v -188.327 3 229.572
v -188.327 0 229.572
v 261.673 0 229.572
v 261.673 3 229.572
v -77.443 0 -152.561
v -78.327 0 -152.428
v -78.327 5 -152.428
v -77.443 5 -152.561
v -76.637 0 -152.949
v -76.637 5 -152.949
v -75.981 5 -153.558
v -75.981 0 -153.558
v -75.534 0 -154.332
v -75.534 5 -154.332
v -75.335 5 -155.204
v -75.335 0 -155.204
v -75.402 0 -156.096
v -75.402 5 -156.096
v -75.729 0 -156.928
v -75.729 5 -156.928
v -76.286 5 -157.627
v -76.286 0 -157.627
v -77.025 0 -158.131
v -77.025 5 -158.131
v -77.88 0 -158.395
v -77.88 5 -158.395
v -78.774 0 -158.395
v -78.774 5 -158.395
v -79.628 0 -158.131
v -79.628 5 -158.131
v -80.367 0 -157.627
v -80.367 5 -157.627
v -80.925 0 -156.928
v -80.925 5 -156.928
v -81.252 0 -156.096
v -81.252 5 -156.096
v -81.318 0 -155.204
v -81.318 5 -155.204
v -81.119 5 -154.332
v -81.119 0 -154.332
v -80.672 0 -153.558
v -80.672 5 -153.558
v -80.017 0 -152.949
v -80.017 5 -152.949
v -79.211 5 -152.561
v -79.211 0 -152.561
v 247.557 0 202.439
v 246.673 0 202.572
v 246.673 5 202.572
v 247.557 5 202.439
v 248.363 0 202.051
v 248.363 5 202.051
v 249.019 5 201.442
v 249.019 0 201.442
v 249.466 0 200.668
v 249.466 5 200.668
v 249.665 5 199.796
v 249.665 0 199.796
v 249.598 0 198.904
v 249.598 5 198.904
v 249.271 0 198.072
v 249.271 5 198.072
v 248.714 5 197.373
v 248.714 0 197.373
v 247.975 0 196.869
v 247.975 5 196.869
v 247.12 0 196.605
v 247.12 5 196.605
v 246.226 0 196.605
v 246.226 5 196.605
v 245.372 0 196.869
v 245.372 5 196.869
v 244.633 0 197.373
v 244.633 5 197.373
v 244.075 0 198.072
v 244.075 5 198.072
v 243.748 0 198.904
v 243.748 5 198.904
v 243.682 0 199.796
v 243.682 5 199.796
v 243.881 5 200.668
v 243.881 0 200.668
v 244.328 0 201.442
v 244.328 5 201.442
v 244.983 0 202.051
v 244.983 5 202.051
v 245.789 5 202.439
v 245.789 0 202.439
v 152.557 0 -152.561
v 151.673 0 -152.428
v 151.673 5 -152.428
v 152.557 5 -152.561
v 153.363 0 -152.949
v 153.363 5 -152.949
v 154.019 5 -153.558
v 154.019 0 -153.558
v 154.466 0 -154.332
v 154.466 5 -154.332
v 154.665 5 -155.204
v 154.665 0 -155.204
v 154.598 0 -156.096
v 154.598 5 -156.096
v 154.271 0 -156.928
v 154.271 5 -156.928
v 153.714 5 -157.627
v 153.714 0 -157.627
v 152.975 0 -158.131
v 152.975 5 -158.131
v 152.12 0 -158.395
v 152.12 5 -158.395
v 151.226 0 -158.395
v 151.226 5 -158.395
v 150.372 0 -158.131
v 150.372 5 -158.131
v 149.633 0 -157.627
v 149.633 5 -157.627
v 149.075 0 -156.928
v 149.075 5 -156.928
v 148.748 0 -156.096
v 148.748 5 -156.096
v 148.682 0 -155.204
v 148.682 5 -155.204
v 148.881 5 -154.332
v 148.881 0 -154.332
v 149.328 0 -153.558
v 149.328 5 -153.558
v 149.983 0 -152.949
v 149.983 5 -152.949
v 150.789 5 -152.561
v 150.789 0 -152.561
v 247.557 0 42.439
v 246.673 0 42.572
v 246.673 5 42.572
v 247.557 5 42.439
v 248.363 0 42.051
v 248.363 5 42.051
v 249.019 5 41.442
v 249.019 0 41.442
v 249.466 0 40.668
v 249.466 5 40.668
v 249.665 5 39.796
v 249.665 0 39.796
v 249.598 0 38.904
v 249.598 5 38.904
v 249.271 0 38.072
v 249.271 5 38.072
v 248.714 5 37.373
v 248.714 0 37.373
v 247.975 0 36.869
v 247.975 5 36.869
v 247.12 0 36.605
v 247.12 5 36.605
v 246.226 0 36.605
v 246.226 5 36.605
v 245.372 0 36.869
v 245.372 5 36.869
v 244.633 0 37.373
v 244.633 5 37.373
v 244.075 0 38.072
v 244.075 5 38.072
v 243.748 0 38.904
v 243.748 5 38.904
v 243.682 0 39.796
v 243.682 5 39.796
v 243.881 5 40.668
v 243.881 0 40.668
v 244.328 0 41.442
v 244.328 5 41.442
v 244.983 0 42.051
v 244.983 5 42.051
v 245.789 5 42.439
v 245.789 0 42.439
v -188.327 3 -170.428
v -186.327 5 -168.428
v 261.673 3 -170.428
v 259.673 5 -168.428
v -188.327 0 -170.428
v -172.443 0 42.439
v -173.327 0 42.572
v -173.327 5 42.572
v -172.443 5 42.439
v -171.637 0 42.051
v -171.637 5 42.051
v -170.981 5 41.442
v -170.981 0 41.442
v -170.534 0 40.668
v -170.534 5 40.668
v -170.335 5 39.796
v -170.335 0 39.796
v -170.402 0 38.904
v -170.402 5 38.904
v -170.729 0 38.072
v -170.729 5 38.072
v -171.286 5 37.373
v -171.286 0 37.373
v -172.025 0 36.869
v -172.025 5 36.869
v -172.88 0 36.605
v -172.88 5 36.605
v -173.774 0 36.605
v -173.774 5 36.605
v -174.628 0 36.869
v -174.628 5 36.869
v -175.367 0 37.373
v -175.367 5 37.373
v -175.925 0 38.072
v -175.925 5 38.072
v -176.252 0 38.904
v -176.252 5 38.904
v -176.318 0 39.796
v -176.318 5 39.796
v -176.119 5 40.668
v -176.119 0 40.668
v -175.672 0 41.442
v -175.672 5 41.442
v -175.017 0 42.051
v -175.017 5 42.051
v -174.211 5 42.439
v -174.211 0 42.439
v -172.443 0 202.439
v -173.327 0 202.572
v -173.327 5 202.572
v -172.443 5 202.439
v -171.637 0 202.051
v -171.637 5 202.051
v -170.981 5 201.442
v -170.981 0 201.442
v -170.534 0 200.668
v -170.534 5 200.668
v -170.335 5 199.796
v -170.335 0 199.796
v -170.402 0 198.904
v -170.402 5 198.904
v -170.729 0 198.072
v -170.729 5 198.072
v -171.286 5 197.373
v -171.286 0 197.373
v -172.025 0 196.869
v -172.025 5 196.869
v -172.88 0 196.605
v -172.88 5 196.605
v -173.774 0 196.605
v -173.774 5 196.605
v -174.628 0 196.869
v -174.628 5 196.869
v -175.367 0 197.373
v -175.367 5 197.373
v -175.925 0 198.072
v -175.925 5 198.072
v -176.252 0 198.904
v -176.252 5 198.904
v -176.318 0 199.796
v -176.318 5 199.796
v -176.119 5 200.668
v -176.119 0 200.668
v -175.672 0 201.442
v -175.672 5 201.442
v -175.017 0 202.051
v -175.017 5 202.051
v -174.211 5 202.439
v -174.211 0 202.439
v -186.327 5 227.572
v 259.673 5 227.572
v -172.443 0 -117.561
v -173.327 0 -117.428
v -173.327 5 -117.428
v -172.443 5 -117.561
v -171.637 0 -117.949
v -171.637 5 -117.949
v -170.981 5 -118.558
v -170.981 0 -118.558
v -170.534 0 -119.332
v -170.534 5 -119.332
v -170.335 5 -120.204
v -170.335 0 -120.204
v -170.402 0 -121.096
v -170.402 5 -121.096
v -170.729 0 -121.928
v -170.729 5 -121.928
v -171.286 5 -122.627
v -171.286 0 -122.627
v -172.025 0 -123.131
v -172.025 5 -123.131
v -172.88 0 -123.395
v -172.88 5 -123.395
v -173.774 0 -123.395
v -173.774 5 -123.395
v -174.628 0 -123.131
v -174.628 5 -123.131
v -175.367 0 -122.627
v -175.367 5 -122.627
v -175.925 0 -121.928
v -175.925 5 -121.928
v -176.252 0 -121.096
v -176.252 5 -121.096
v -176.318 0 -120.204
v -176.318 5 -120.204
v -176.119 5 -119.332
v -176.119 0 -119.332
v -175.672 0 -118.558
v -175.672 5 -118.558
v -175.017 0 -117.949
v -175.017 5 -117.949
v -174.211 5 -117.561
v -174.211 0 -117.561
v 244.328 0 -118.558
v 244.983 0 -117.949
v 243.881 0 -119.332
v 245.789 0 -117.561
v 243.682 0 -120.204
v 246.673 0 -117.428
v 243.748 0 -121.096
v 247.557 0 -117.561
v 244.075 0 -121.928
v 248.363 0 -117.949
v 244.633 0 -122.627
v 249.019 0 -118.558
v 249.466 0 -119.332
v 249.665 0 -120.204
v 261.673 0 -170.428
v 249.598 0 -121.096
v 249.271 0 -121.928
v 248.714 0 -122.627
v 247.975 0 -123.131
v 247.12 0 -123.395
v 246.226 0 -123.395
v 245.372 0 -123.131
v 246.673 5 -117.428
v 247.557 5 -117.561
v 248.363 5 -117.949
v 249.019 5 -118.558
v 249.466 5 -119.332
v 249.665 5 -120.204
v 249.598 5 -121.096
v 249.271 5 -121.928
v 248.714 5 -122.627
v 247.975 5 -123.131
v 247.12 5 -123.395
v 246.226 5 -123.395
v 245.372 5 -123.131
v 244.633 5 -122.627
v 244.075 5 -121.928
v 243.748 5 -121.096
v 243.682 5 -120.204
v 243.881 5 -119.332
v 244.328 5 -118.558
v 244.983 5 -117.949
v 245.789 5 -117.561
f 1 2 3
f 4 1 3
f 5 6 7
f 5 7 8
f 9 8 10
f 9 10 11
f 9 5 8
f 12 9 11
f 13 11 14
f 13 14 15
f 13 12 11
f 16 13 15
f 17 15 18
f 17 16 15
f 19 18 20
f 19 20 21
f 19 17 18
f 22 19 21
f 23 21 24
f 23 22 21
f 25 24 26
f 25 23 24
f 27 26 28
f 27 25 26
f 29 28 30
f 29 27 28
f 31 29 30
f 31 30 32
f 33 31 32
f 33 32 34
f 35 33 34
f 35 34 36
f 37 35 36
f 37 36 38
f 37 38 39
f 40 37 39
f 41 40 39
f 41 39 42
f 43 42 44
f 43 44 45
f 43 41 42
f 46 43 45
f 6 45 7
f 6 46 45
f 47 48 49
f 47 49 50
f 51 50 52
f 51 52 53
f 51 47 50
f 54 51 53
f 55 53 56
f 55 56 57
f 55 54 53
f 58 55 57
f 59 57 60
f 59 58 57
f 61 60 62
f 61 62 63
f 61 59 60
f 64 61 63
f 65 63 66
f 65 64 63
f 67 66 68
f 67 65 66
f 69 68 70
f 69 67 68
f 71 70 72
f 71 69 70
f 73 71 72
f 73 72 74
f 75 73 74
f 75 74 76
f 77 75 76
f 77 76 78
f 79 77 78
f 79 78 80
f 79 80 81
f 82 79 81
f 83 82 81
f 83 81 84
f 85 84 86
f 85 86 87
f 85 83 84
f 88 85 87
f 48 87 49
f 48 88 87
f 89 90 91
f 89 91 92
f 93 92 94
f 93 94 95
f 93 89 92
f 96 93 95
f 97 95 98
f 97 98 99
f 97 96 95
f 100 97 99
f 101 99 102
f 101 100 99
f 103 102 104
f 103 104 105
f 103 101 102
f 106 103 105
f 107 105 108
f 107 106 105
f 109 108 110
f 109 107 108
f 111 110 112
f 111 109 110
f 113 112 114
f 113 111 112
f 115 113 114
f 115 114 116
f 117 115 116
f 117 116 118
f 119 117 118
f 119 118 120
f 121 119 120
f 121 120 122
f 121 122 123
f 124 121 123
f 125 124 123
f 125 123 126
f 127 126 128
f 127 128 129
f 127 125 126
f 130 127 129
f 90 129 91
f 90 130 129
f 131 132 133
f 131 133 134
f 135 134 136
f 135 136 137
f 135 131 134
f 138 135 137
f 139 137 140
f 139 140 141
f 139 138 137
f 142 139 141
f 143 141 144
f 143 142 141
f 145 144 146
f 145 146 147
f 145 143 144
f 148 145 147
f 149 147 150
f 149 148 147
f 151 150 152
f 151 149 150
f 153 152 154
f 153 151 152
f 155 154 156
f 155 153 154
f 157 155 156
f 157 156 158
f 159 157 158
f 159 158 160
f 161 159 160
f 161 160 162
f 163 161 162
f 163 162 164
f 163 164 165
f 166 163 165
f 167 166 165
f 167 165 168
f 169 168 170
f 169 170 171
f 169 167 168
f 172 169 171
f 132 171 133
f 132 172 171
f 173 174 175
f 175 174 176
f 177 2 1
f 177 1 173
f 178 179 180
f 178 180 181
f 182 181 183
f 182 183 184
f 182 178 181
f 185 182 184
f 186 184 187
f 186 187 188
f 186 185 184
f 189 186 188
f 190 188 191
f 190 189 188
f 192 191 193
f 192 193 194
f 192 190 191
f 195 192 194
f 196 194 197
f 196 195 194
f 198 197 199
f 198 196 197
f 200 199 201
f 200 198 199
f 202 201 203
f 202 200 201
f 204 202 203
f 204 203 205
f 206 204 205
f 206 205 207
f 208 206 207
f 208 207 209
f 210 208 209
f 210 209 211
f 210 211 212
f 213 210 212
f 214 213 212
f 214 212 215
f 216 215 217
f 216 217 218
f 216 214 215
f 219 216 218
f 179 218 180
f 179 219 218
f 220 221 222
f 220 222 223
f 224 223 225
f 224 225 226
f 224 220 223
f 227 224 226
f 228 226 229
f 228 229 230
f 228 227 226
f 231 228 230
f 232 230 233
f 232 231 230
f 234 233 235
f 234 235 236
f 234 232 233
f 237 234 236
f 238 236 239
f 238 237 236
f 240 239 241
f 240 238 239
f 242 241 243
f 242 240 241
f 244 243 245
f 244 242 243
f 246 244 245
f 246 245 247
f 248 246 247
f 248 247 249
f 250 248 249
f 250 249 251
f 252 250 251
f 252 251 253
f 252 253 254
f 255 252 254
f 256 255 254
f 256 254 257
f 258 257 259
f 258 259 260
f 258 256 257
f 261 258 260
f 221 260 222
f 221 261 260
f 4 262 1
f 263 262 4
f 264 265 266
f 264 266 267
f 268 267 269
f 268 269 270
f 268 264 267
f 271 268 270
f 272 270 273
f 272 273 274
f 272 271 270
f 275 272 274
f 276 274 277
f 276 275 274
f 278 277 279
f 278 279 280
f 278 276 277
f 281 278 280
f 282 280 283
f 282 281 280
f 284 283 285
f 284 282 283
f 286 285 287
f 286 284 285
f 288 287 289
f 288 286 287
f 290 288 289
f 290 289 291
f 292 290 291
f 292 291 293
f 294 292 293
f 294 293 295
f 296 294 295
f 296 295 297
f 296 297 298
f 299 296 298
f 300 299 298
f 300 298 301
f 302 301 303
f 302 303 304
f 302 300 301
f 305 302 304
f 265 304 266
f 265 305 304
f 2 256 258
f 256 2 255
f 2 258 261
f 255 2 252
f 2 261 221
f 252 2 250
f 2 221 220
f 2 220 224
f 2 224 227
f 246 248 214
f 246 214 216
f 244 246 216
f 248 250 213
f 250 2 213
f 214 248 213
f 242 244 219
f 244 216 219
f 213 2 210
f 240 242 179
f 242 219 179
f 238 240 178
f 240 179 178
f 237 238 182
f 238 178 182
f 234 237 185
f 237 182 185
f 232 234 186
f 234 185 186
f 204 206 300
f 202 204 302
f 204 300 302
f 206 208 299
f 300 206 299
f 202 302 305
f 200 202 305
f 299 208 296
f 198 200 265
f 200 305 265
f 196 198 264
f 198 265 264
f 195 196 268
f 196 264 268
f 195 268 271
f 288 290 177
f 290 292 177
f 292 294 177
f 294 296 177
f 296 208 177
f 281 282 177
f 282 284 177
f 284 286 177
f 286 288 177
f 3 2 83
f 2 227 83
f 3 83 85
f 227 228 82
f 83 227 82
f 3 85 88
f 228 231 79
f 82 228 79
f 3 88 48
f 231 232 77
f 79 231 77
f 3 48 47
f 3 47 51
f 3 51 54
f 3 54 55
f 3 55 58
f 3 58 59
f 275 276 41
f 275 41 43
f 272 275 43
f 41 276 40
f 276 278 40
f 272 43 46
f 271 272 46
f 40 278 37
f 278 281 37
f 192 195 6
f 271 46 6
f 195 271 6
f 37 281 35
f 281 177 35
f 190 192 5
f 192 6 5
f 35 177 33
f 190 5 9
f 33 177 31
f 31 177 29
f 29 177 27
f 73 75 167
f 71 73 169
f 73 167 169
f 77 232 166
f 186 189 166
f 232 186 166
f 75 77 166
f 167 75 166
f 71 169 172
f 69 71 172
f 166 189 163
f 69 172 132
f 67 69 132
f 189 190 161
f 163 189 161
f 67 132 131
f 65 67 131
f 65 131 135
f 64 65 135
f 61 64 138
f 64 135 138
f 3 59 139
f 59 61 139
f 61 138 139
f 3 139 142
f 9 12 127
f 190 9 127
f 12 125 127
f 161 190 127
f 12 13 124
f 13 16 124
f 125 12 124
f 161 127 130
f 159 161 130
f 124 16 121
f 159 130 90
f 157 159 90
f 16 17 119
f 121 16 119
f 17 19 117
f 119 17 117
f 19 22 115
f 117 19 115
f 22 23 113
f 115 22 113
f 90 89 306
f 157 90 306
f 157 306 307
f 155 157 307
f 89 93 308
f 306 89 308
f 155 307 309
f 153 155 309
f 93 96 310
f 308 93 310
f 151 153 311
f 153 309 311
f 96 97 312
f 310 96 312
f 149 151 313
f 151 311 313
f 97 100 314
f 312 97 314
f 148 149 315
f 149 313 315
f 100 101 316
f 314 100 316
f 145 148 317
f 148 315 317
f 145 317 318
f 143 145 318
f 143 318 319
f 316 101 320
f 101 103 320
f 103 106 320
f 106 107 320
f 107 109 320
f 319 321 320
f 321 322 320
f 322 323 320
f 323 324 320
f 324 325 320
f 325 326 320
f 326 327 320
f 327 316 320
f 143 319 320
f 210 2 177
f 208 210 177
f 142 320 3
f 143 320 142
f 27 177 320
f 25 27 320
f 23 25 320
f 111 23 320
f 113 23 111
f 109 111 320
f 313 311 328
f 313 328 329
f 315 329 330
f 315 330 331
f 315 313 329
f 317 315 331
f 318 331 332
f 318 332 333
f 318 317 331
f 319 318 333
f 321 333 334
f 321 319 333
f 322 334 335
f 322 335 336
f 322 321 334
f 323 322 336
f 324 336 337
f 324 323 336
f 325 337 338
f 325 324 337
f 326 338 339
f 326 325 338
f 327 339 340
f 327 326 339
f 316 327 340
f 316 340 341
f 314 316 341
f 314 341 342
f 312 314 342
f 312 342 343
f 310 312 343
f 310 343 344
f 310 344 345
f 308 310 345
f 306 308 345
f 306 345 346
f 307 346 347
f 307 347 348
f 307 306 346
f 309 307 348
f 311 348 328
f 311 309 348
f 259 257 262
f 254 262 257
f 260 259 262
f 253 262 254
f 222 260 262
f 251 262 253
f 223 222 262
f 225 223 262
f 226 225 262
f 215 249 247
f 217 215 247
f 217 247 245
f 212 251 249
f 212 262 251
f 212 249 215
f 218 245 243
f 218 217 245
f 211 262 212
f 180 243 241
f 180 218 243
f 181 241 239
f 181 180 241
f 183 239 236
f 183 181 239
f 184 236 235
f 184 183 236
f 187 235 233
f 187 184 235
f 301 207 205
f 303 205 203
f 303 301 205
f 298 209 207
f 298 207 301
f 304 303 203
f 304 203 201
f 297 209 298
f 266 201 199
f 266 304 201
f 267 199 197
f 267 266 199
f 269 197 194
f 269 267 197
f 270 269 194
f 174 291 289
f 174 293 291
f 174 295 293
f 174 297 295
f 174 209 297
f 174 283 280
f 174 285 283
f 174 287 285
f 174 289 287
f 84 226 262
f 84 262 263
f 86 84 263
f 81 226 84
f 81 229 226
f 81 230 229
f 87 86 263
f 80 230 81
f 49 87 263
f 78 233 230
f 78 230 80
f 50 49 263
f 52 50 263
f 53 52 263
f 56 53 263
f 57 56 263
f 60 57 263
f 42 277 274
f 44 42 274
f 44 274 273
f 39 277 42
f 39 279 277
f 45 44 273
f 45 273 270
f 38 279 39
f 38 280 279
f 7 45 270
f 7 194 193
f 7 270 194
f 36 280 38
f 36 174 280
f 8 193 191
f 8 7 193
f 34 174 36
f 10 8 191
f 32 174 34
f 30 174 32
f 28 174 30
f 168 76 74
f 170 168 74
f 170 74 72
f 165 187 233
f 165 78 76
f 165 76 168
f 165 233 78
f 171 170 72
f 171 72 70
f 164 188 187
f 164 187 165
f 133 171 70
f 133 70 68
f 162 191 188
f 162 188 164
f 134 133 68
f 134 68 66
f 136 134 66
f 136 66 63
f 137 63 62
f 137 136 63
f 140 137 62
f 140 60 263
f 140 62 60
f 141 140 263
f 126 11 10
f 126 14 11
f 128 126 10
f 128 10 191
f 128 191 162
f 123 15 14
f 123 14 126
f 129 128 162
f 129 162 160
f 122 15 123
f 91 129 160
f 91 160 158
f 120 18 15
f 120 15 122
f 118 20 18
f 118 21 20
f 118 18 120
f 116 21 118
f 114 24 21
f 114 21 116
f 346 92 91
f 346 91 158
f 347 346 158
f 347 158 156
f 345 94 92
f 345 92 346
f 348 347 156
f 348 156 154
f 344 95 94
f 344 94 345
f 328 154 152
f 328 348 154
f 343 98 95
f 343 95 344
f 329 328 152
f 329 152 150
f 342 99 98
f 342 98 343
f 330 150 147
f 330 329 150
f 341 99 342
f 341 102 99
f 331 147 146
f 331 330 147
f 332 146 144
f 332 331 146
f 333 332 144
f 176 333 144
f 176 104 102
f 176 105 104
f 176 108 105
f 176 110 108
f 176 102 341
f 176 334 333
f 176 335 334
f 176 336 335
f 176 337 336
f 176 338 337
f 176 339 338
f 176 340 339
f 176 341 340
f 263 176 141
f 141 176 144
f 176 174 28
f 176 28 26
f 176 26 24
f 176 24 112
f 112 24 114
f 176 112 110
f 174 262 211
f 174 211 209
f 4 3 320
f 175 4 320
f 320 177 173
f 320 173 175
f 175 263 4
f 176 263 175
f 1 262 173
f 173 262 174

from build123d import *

# Parameters (mm, degrees)
CROQUIS1_W              = 450
CROQUIS1_H              = 400
CROQUIS1_R              = 3
SALIENTE_EXTRUIR1_DEPTH = 5
CHAFL_N1_SIZE           = 2


with BuildPart() as part:
    # Croquis1 → Saliente-Extruir1 (new body)
    with BuildSketch(Plane(origin=(0, 0, 0), x_dir=(1, 0, 0), z_dir=(0, 1, 0))):
        with Locations((36.673151751, -29.571984436)):
            Rectangle(CROQUIS1_W, CROQUIS1_H)
        with Locations(Location((-173.326848249, 120.428015564, 0), (0, 0, 270))):
            Circle(CROQUIS1_R, mode=Mode.SUBTRACT)
        with Locations(Location((-173.326848249, -199.571984436, 0), (0, 0, 270))):
            Circle(CROQUIS1_R, mode=Mode.SUBTRACT)
        with Locations(Location((246.673151751, -199.571984436, 0), (0, 0, 270))):
            Circle(CROQUIS1_R, mode=Mode.SUBTRACT)
        with Locations(Location((246.673151751, 120.428015564, 0), (0, 0, 270))):
            Circle(CROQUIS1_R, mode=Mode.SUBTRACT)
        with Locations(Location((-173.326848249, -39.571984436, 0), (0, 0, 270))):
            Circle(CROQUIS1_R, mode=Mode.SUBTRACT)
        with Locations(Location((246.673151751, -39.571984436, 0), (0, 0, 270))):
            Circle(CROQUIS1_R, mode=Mode.SUBTRACT)
        with Locations(Location((-78.326848249, 155.428015564, 0), (0, 0, 270))):
            Circle(CROQUIS1_R, mode=Mode.SUBTRACT)
        with Locations(Location((151.673151751, 155.428015564, 0), (0, 0, 270))):
            Circle(CROQUIS1_R, mode=Mode.SUBTRACT)
    extrude(amount=SALIENTE_EXTRUIR1_DEPTH)

    # Chaflán1
    chafl_n1_edges = [part.edges().sort_by_distance(p)[0] for p in [
        (261.673151751, 5, 29.571984436),
        (36.673151751, 5, -170.428015564),
        (-188.326848249, 5, 29.571984436),
        (36.673151751, 5, 229.571984436),
    ]]
    chamfer(chafl_n1_edges, length=CHAFL_N1_SIZE)


solid = part.part
